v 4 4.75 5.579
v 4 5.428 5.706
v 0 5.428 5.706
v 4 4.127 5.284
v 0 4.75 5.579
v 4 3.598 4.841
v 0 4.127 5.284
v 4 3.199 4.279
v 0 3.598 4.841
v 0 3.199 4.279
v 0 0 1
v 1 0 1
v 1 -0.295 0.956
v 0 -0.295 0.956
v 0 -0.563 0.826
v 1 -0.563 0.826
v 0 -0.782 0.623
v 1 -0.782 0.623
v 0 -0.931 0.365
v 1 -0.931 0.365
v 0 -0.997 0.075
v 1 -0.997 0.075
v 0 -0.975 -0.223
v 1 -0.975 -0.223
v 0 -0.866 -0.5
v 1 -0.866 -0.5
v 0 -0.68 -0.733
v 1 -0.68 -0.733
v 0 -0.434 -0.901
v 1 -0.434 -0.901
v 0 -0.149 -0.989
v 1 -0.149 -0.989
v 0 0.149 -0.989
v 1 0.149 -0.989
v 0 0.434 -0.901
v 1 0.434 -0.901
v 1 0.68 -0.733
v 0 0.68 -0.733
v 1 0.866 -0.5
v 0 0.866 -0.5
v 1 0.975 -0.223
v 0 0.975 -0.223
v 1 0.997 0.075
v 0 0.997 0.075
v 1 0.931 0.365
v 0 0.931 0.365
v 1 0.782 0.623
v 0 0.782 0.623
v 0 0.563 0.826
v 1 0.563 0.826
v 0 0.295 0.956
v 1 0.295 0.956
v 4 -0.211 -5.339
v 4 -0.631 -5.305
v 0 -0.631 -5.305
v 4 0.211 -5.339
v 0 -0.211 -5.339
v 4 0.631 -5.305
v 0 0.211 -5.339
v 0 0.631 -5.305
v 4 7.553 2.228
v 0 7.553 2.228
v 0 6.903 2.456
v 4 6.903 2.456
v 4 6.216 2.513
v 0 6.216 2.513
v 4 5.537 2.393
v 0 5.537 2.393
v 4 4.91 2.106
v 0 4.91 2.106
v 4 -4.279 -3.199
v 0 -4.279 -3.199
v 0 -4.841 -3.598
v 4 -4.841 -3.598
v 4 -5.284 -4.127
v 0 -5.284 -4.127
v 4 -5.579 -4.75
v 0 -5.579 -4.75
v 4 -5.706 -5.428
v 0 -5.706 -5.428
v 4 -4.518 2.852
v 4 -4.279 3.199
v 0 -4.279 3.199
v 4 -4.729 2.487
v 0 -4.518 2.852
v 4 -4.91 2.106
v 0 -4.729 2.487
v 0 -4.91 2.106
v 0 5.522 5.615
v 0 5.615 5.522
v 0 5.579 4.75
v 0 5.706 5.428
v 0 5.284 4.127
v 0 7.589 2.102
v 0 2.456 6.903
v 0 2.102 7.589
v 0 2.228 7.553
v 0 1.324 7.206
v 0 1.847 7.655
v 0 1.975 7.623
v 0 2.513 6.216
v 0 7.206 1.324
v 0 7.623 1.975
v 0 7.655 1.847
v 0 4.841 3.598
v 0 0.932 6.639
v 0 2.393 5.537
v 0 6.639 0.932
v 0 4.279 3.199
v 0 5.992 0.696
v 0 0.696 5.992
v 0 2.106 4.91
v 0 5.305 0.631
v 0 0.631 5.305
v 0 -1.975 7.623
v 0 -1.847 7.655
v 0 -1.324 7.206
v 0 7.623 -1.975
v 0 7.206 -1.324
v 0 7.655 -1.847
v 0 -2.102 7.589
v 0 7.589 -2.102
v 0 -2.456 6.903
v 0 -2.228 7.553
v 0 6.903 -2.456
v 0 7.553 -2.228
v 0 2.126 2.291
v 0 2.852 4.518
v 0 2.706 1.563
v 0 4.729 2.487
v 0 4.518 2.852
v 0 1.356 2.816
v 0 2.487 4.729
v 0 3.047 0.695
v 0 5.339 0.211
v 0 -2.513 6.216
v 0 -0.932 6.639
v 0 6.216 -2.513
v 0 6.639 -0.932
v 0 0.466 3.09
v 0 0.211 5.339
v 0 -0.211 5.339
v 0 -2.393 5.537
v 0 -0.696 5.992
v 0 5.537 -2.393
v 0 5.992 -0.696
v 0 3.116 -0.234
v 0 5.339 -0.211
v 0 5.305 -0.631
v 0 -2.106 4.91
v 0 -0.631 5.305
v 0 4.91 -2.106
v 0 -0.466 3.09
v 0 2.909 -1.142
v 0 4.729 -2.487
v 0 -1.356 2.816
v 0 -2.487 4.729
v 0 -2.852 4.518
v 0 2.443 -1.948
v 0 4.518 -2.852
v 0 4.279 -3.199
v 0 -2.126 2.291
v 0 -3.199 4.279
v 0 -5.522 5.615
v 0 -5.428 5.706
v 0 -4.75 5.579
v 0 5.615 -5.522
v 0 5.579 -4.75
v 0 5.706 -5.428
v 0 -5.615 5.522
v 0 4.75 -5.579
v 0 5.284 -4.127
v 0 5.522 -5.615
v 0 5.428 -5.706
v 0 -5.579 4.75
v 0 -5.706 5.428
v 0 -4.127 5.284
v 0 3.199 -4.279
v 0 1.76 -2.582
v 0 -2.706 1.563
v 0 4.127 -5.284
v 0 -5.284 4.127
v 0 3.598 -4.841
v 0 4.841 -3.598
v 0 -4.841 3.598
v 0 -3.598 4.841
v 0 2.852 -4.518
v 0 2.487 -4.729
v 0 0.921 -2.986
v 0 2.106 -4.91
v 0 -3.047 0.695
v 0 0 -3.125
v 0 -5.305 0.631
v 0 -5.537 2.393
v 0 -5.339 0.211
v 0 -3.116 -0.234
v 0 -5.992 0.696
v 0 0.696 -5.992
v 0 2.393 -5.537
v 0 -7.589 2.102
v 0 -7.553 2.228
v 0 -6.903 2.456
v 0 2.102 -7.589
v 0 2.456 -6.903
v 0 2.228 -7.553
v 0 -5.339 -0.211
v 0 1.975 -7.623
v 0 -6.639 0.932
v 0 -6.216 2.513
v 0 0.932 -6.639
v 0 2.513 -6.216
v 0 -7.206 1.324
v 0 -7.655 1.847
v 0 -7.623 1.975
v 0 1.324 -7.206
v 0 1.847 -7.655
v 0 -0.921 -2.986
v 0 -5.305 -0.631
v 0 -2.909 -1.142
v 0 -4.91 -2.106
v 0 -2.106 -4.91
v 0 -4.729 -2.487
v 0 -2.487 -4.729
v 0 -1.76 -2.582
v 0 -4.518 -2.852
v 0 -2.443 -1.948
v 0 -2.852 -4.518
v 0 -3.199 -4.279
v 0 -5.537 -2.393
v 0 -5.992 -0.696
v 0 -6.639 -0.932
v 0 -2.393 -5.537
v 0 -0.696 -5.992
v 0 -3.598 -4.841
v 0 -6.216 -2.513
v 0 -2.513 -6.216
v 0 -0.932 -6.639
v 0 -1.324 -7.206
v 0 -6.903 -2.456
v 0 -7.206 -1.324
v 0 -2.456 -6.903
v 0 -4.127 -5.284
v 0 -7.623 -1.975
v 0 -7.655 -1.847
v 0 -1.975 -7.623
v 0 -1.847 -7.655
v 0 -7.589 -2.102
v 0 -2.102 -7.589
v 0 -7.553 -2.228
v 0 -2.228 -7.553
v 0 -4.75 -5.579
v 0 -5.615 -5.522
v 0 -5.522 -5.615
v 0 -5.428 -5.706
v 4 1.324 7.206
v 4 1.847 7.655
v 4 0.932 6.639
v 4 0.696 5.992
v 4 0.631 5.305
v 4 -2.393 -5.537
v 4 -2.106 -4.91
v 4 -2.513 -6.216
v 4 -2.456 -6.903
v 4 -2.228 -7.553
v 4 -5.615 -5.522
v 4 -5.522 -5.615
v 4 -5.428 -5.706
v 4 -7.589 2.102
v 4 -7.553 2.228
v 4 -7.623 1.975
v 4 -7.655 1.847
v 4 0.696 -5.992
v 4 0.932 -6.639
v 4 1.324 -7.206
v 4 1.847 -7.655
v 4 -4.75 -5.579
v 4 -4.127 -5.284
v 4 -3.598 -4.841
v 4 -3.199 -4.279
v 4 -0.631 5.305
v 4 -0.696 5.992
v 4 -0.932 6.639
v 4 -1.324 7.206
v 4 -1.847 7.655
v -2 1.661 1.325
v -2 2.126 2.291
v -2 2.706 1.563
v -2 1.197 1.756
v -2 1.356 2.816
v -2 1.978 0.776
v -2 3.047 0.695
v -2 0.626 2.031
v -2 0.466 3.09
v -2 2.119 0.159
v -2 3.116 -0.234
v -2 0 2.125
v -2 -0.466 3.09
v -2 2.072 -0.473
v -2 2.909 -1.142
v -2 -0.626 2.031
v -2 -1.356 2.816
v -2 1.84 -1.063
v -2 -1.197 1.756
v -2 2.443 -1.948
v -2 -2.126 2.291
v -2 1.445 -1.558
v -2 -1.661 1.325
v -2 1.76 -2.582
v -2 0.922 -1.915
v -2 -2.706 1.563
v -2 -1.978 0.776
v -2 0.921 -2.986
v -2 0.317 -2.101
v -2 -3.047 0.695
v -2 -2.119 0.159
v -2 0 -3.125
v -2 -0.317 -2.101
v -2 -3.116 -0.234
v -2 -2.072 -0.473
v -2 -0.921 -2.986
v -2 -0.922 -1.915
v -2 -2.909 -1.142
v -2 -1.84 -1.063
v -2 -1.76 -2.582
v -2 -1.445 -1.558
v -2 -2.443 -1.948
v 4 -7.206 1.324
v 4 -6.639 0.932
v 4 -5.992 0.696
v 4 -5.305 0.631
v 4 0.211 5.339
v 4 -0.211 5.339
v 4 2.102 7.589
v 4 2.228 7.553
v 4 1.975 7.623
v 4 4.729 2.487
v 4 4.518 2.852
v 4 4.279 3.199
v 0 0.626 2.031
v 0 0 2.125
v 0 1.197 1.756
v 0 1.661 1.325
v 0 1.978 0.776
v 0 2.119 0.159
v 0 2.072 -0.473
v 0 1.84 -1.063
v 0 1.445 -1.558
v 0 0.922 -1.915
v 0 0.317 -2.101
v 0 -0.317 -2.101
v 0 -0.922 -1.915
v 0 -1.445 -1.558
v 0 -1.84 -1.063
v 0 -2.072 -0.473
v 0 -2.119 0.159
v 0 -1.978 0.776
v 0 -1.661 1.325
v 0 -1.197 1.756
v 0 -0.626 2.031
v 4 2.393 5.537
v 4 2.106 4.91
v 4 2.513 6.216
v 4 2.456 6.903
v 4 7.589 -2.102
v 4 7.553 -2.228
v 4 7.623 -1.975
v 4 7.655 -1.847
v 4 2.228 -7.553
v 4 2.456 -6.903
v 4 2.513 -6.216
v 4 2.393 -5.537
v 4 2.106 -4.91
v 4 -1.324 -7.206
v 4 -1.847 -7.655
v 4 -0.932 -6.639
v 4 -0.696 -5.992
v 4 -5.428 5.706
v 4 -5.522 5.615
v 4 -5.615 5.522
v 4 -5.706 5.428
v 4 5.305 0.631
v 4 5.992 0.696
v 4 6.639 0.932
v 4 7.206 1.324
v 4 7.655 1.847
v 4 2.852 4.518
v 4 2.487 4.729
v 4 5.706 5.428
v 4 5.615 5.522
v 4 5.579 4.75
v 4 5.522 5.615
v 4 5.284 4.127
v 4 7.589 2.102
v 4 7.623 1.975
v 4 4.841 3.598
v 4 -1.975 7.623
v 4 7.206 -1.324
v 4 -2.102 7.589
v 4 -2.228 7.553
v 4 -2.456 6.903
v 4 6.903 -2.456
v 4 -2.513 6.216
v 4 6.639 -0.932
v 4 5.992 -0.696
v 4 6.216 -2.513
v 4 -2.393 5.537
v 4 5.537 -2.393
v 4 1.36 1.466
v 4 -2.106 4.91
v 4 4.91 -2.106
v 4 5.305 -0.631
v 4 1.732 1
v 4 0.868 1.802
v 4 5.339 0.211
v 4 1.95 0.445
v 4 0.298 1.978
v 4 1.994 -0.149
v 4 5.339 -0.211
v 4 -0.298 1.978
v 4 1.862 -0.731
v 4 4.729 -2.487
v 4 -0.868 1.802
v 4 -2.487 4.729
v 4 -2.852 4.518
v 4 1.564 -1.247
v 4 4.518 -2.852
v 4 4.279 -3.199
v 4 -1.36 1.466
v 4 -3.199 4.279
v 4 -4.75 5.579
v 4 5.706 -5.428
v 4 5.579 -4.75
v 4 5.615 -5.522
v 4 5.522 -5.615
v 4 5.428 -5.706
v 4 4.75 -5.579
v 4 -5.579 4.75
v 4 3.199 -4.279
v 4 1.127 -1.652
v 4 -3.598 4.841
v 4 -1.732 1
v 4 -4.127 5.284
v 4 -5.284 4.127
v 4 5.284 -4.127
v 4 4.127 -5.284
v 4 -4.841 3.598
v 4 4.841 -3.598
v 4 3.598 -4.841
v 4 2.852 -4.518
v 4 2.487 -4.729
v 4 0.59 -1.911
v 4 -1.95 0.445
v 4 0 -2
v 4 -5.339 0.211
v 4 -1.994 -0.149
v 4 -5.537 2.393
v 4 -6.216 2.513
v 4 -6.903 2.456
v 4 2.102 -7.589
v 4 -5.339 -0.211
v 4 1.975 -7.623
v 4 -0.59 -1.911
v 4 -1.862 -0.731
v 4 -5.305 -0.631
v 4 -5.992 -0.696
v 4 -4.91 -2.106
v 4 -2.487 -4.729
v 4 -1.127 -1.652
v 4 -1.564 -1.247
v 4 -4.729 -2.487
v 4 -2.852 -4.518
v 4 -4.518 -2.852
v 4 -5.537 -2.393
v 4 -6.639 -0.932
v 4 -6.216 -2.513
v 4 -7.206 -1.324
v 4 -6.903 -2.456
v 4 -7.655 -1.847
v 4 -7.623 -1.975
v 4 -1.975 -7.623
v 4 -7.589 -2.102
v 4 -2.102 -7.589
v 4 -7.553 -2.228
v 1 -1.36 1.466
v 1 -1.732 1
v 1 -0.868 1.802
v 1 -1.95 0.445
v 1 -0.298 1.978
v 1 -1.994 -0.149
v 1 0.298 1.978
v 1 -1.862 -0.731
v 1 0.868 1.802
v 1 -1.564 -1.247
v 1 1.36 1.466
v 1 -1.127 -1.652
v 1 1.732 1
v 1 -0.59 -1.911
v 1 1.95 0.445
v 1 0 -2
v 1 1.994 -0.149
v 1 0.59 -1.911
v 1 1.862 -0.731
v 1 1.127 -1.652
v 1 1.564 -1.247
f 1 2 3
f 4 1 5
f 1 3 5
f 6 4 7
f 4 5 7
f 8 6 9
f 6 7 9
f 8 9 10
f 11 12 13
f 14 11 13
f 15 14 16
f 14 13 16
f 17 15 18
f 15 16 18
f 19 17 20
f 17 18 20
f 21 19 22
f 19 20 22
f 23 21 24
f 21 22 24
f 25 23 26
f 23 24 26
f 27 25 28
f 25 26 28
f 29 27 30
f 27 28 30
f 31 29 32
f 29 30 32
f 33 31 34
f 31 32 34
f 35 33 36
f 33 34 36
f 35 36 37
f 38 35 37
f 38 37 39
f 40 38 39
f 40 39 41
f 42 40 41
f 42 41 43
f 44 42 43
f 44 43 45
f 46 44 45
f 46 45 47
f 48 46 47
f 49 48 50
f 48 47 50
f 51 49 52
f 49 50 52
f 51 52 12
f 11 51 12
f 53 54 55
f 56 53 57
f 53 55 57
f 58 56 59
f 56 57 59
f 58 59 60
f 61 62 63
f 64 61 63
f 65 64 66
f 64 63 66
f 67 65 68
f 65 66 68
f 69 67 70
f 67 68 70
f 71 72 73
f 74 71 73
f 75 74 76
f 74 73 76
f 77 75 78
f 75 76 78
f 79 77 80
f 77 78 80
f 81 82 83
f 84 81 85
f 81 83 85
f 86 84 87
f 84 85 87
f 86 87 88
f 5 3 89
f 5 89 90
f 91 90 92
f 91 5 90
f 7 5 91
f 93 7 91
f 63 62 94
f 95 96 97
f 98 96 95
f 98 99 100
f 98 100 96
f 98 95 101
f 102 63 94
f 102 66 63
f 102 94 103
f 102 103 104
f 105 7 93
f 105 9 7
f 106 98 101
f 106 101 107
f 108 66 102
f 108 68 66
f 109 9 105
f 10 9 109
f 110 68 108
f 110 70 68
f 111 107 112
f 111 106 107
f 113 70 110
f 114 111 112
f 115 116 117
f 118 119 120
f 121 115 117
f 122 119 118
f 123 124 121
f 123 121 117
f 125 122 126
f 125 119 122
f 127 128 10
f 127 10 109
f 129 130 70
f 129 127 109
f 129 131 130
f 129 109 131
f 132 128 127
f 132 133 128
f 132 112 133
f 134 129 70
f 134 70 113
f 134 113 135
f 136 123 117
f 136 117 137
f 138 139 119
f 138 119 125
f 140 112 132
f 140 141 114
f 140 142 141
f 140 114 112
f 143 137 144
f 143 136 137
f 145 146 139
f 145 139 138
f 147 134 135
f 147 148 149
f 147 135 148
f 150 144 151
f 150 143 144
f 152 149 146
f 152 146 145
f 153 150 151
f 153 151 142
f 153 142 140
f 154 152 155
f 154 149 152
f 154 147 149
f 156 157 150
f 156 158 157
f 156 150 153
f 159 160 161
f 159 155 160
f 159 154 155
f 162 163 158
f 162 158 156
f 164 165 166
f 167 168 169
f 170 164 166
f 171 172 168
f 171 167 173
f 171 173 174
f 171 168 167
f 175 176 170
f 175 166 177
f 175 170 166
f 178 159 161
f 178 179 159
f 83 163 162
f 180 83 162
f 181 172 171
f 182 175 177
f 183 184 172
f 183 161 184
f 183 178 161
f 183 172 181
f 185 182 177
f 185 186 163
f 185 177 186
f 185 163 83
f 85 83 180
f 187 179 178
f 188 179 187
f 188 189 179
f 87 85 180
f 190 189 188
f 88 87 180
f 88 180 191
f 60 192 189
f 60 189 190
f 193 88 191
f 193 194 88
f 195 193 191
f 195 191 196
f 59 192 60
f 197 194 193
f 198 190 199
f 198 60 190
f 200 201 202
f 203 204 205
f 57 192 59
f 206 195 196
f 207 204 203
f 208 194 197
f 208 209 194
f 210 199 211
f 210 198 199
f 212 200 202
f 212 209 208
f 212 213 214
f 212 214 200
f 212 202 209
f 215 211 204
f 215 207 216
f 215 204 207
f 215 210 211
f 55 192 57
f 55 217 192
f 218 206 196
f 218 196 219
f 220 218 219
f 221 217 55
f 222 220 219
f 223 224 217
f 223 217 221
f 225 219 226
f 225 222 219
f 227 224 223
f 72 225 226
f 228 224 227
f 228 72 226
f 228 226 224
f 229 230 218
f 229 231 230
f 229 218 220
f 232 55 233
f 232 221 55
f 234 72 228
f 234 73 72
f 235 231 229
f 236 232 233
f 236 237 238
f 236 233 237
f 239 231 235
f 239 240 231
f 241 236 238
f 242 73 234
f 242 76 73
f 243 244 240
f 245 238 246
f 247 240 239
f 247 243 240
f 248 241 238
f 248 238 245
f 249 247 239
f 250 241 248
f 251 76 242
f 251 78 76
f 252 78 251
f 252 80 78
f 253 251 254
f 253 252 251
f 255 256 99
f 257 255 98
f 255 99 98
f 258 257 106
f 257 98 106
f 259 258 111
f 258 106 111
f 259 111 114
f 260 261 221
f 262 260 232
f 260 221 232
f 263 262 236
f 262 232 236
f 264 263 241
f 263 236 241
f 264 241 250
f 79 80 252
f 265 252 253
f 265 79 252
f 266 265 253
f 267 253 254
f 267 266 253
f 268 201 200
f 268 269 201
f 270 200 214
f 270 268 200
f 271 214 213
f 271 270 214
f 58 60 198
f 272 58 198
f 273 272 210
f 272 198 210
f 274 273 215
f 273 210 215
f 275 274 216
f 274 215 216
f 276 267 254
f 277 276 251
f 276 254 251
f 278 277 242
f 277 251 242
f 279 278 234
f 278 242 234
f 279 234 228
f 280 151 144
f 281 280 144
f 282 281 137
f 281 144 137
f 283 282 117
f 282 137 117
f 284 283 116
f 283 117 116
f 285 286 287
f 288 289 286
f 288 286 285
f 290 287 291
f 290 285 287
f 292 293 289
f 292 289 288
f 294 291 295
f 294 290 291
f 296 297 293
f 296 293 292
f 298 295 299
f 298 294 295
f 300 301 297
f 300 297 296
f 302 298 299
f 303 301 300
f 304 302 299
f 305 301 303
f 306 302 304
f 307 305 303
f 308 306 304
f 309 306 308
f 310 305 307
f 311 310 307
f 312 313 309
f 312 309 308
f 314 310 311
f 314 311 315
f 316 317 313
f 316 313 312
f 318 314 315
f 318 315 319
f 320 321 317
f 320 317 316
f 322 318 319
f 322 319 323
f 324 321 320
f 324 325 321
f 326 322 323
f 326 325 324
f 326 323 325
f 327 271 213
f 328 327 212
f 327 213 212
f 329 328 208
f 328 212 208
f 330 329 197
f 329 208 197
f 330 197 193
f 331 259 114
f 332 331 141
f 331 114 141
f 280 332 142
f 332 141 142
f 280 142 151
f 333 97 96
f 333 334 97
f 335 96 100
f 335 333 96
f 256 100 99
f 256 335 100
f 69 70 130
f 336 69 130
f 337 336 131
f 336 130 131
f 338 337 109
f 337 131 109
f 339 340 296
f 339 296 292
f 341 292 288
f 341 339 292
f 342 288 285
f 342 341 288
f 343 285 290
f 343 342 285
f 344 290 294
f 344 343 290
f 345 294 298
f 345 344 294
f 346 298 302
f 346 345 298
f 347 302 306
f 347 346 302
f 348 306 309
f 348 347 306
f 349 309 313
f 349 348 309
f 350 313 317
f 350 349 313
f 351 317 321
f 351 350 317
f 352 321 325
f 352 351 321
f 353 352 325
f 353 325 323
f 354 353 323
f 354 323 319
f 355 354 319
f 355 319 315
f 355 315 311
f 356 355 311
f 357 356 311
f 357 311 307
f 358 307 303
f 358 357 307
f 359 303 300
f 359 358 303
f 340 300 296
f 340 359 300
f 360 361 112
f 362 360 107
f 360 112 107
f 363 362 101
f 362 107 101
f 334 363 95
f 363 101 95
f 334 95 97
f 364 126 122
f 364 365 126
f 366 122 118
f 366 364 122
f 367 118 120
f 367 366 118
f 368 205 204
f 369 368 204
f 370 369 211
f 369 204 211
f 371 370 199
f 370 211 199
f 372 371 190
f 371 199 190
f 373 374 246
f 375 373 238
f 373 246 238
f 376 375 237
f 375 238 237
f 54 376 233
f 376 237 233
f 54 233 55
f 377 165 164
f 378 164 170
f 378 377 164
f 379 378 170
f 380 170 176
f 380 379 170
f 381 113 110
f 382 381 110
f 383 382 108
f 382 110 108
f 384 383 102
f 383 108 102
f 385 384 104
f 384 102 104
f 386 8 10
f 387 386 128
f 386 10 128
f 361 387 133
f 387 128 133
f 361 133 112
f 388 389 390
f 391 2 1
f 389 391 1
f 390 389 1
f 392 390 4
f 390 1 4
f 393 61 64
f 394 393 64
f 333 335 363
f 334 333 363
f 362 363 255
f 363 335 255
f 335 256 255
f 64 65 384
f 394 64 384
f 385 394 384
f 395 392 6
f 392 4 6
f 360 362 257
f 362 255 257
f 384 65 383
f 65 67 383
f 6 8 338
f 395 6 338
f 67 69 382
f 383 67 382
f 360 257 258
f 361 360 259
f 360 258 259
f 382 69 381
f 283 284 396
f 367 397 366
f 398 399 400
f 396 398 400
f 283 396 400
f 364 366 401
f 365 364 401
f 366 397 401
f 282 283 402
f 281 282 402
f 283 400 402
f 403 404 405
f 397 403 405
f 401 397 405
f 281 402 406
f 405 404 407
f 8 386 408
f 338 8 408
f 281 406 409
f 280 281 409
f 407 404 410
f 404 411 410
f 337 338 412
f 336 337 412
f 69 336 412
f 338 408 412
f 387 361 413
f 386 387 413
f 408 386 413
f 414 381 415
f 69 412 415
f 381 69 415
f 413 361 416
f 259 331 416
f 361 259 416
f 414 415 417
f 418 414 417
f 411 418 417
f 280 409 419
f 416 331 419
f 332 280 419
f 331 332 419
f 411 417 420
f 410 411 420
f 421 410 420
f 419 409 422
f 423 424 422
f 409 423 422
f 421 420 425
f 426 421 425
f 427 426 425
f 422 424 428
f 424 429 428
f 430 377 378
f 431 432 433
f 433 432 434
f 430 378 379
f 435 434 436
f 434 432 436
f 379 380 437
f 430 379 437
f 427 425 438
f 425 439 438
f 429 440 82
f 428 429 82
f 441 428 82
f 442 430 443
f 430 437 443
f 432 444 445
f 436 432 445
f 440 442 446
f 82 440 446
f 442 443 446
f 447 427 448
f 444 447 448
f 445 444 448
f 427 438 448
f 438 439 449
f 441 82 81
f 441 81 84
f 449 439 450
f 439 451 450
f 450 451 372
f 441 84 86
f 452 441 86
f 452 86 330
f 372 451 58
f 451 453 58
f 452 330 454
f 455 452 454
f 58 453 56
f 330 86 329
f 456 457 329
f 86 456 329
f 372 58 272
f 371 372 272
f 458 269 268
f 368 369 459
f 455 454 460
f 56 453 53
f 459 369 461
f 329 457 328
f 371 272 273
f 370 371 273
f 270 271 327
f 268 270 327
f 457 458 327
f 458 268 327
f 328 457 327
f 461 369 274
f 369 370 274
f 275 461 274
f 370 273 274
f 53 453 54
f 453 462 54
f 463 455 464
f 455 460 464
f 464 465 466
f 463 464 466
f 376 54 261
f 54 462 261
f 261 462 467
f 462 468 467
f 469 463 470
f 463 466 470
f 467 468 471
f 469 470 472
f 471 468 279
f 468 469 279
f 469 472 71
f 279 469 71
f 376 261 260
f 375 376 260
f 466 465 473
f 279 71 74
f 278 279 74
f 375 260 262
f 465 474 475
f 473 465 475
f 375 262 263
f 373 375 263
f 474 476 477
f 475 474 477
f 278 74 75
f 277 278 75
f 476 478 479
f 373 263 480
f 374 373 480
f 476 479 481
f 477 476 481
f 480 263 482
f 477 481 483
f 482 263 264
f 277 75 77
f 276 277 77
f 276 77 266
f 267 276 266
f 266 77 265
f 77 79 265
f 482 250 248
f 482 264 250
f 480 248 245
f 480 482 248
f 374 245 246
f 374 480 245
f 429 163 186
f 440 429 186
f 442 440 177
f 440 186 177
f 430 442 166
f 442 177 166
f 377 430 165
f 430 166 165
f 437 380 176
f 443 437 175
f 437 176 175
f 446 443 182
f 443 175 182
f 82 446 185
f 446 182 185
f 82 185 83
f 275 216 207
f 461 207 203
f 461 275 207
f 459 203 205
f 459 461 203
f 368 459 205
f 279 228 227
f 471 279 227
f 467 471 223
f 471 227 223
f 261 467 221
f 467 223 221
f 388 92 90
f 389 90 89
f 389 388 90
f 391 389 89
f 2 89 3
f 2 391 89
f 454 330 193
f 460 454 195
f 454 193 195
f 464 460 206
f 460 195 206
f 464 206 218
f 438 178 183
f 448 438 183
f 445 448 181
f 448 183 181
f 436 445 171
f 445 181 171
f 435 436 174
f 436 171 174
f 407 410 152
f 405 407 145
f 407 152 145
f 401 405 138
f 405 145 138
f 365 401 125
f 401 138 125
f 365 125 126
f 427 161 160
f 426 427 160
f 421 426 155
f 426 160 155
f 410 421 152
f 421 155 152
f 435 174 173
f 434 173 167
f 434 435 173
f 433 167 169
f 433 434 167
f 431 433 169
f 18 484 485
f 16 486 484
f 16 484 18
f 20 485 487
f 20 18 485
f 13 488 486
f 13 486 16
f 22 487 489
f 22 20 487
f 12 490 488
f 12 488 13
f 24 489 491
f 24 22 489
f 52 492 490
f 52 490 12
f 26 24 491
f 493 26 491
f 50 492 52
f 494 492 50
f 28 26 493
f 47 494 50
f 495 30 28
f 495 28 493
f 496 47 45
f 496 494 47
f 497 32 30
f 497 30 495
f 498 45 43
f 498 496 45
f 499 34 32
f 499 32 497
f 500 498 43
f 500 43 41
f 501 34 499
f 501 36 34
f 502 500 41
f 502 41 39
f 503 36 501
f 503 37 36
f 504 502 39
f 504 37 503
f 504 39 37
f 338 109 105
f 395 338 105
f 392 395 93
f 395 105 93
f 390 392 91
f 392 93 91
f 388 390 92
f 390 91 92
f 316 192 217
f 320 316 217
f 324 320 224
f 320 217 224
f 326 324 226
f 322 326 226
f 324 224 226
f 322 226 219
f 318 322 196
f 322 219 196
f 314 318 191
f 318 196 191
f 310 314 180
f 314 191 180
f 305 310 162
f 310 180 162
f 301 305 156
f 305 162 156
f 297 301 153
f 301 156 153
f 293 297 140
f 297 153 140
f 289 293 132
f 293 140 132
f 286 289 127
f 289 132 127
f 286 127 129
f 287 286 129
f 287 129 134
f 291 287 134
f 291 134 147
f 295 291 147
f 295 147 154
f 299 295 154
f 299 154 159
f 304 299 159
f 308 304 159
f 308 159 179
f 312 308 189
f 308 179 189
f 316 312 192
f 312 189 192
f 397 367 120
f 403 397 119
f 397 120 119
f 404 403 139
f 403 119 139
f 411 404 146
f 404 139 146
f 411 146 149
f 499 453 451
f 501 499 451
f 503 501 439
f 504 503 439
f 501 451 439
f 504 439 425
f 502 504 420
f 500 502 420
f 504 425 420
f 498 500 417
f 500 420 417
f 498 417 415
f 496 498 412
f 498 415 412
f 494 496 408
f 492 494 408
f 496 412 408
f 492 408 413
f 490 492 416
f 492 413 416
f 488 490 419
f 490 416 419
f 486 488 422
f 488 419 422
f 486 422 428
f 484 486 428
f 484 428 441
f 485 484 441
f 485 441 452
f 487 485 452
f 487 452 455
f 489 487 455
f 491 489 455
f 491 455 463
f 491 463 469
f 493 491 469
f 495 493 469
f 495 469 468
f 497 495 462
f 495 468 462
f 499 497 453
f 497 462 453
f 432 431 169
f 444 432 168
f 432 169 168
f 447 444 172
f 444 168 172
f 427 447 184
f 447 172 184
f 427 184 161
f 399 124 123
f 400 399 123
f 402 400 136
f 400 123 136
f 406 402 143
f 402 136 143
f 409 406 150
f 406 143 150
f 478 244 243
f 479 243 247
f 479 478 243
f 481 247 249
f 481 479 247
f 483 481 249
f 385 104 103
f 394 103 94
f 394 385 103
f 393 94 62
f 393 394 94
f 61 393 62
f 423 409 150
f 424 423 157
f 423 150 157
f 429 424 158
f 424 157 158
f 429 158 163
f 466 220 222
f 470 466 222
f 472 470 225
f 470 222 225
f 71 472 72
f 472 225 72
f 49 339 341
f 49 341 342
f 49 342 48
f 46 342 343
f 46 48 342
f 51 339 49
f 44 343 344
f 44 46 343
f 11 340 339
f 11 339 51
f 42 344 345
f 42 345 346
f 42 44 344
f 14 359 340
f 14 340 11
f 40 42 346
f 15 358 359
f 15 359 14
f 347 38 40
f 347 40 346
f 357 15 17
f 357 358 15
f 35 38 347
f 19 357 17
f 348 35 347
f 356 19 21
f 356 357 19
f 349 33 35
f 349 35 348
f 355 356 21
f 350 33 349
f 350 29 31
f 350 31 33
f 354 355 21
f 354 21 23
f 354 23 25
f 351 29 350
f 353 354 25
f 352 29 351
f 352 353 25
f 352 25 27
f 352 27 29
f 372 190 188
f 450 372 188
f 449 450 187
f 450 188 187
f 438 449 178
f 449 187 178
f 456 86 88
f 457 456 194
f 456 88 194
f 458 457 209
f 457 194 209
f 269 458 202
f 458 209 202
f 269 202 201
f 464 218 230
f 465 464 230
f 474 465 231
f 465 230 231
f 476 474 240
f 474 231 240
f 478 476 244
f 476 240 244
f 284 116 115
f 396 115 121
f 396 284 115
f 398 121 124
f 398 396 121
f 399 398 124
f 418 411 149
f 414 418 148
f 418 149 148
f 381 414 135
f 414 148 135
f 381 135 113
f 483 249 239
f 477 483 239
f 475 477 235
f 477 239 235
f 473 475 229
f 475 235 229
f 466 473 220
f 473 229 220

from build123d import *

# Parameters (mm, degrees)
BASPROSKE_W         = 4
BASPROSKE_H         = 7.875
TOOTHCUT_DEPTH      = 12.833480046
TEETHCUTS_COUNT     = 12
TEETHCUTS_ANGLE     = 330
BORSKE_R            = 1
BORE_DEPTH          = 50.0000508
SKETCH1_R           = 3.125
SKETCH1_R_2         = 2.125
BOSS_EXTRUDE1_DEPTH = 2
SKETCH2_R           = 2
CUT_EXTRUDE1_DEPTH  = 3


with BuildPart() as part:
    # BasProSke → Base-Revolve (revolve)
    with BuildSketch(Plane(origin=(0, 0, 0), x_dir=(1, 0, 0), z_dir=(0, 1, 0)), mode=Mode.PRIVATE) as base_revolve_sk:
        with Locations((2, 3.9375)):
            Rectangle(BASPROSKE_W, BASPROSKE_H)
    revolve(base_revolve_sk.sketch.rotate(Axis((-10, 0, 0), (1, 0, 0)), 180), axis=Axis((-10, 0, 0), (1, 0, 0)))

    # TooCutSke → ToothCut (cut, through all)
    with BuildSketch(Plane(origin=(0, 0, 0), x_dir=(0, 0, -1), z_dir=(1, 0, 0))):
        with BuildLine():
            ThreePointArc((0.631439839, 5.305305014), (0, 5.34275), (-0.631439839, 5.305305014))
            ThreePointArc((-0.631439839, 5.305305014), (-0.93992237, 6.654932089), (-1.876748184, 7.674251521))
            ThreePointArc((-1.876748184, 7.674251521), (0, 7.9004), (1.876748184, 7.674251521))
            ThreePointArc((1.876748184, 7.674251521), (0.93992237, 6.654932089), (0.631439839, 5.305305014))
        make_face()
    toothcut = extrude(amount=TOOTHCUT_DEPTH, mode=Mode.SUBTRACT)

    # TeethCuts: ToothCut ×12 about axis
    teethcuts_axis = Axis((-10, 0, 0), (1, 0, 0))
    for i in range(1, TEETHCUTS_COUNT):
        add(toothcut.rotate(teethcuts_axis, i * TEETHCUTS_ANGLE / (TEETHCUTS_COUNT - 1)), mode=Mode.SUBTRACT)

    # BorSke → Bore (cut, symmetric)
    with BuildSketch(Plane(origin=(0, 0, 0), x_dir=(0, 0, -1), z_dir=(1, 0, 0))):
        with Locations(Location((0, 0, 0), (0, 0, 180))):
            Circle(BORSKE_R)
    extrude(amount=BORE_DEPTH, both=True, mode=Mode.SUBTRACT)

    # Sketch1 → Boss-Extrude1 (add)
    with BuildSketch(Plane.ZY):
        with Locations(Location((0, 0, 0), (0, 0, 180))):
            Circle(SKETCH1_R)
        Circle(SKETCH1_R_2, mode=Mode.SUBTRACT)
    extrude(amount=BOSS_EXTRUDE1_DEPTH)

    # Sketch2 → Cut-Extrude1 (cut)
    with BuildSketch(Plane(origin=(4, 0, 0), x_dir=(0, 0, -1), z_dir=(1, 0, 0))):
        Circle(SKETCH2_R)
    extrude(amount=-CUT_EXTRUDE1_DEPTH, mode=Mode.SUBTRACT)


solid = part.part
